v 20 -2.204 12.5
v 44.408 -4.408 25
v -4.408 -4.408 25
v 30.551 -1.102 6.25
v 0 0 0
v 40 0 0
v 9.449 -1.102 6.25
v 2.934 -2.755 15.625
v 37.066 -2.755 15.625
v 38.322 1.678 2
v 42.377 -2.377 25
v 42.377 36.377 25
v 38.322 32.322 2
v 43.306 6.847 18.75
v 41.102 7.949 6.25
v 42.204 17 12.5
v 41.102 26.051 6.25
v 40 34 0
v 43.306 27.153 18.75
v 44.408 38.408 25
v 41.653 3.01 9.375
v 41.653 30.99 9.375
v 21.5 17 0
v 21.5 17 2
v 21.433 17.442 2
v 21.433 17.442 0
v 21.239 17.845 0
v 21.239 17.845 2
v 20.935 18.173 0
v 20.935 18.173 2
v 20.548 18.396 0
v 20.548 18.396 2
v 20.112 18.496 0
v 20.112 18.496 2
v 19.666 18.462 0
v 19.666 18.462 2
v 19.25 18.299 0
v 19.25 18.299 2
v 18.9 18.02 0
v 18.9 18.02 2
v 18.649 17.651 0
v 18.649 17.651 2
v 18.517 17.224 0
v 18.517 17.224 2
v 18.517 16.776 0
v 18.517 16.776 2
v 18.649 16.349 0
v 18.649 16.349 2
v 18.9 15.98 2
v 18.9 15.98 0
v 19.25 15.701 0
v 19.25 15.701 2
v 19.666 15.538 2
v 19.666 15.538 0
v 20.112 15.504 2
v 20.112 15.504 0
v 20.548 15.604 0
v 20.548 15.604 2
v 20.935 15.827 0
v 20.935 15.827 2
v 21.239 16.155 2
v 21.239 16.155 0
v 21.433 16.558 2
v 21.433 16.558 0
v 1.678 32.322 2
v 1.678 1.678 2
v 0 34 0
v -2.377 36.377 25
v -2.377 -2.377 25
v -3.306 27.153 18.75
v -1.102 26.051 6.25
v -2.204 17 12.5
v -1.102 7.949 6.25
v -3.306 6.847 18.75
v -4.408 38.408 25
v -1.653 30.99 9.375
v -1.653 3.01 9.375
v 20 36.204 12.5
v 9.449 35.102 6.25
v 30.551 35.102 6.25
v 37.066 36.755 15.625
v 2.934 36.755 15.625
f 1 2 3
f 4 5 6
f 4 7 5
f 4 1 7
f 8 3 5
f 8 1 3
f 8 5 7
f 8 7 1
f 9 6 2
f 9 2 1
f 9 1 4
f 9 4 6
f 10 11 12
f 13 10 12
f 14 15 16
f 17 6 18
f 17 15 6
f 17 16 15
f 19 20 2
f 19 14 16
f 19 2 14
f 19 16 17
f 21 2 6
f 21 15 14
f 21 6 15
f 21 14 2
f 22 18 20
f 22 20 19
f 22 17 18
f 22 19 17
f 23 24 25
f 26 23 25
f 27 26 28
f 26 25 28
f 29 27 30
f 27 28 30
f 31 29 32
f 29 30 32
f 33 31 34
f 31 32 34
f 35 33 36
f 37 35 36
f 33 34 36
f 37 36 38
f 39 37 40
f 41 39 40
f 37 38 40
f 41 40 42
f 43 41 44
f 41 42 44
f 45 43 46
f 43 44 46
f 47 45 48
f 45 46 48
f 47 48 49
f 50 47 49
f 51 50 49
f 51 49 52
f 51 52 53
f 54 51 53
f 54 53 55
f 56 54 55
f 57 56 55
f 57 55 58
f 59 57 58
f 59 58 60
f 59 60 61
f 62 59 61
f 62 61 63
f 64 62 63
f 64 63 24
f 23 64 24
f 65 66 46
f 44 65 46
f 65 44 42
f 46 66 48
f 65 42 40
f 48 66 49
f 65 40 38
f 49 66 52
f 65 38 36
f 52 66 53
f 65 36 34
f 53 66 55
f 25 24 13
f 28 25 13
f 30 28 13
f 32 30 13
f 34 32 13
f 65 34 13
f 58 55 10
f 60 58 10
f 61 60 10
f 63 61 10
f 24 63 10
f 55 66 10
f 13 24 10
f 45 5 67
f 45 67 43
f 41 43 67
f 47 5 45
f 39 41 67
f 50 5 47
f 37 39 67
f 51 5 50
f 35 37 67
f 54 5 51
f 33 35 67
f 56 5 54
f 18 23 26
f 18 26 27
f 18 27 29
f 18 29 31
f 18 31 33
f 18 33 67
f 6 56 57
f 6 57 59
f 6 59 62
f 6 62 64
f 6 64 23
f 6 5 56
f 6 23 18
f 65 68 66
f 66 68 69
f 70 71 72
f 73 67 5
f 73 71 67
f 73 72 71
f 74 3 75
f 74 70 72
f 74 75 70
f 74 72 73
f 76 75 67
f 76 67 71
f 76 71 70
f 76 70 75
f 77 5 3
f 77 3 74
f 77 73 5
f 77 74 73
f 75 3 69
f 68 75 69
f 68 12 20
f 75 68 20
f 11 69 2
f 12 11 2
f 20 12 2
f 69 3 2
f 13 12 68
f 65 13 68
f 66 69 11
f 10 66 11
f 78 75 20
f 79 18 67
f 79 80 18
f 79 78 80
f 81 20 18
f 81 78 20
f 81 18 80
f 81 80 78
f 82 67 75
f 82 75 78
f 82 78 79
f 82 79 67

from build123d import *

# Parameters (mm, degrees)
F1_DEPTH = 25
F1_TAPER = -10
F2_T     = -2
F3_R     = 1.5
F4_DEPTH = 25


with BuildPart() as f1:
    # F0 (on Top) → F1 (new body)
    with BuildSketch(Plane.XY):
        Polygon((0, 13), (0, 0), (8, 0), (13, 0), (27, 0), (32, 0), (40, 0), (40, 13), (40, 21), (40, 34), (32, 34), (27, 34), (13, 34), (8, 34), (0, 34), (0, 21), align=None)
    extrude(amount=F1_DEPTH, taper=F1_TAPER)

    # F2
    f2_openings = [f1.faces().sort_by_distance(p)[0] for p in [
        (20, 17, 25),
    ]]
    offset(amount=F2_T, openings=f2_openings)

    # F3 (on face) → F4 (cut)
    with BuildSketch(Plane.XY.offset(2)):
        with Locations((20, 17)):
            Circle(F3_R)
    extrude(amount=-F4_DEPTH, mode=Mode.SUBTRACT)


solid = f1.part
